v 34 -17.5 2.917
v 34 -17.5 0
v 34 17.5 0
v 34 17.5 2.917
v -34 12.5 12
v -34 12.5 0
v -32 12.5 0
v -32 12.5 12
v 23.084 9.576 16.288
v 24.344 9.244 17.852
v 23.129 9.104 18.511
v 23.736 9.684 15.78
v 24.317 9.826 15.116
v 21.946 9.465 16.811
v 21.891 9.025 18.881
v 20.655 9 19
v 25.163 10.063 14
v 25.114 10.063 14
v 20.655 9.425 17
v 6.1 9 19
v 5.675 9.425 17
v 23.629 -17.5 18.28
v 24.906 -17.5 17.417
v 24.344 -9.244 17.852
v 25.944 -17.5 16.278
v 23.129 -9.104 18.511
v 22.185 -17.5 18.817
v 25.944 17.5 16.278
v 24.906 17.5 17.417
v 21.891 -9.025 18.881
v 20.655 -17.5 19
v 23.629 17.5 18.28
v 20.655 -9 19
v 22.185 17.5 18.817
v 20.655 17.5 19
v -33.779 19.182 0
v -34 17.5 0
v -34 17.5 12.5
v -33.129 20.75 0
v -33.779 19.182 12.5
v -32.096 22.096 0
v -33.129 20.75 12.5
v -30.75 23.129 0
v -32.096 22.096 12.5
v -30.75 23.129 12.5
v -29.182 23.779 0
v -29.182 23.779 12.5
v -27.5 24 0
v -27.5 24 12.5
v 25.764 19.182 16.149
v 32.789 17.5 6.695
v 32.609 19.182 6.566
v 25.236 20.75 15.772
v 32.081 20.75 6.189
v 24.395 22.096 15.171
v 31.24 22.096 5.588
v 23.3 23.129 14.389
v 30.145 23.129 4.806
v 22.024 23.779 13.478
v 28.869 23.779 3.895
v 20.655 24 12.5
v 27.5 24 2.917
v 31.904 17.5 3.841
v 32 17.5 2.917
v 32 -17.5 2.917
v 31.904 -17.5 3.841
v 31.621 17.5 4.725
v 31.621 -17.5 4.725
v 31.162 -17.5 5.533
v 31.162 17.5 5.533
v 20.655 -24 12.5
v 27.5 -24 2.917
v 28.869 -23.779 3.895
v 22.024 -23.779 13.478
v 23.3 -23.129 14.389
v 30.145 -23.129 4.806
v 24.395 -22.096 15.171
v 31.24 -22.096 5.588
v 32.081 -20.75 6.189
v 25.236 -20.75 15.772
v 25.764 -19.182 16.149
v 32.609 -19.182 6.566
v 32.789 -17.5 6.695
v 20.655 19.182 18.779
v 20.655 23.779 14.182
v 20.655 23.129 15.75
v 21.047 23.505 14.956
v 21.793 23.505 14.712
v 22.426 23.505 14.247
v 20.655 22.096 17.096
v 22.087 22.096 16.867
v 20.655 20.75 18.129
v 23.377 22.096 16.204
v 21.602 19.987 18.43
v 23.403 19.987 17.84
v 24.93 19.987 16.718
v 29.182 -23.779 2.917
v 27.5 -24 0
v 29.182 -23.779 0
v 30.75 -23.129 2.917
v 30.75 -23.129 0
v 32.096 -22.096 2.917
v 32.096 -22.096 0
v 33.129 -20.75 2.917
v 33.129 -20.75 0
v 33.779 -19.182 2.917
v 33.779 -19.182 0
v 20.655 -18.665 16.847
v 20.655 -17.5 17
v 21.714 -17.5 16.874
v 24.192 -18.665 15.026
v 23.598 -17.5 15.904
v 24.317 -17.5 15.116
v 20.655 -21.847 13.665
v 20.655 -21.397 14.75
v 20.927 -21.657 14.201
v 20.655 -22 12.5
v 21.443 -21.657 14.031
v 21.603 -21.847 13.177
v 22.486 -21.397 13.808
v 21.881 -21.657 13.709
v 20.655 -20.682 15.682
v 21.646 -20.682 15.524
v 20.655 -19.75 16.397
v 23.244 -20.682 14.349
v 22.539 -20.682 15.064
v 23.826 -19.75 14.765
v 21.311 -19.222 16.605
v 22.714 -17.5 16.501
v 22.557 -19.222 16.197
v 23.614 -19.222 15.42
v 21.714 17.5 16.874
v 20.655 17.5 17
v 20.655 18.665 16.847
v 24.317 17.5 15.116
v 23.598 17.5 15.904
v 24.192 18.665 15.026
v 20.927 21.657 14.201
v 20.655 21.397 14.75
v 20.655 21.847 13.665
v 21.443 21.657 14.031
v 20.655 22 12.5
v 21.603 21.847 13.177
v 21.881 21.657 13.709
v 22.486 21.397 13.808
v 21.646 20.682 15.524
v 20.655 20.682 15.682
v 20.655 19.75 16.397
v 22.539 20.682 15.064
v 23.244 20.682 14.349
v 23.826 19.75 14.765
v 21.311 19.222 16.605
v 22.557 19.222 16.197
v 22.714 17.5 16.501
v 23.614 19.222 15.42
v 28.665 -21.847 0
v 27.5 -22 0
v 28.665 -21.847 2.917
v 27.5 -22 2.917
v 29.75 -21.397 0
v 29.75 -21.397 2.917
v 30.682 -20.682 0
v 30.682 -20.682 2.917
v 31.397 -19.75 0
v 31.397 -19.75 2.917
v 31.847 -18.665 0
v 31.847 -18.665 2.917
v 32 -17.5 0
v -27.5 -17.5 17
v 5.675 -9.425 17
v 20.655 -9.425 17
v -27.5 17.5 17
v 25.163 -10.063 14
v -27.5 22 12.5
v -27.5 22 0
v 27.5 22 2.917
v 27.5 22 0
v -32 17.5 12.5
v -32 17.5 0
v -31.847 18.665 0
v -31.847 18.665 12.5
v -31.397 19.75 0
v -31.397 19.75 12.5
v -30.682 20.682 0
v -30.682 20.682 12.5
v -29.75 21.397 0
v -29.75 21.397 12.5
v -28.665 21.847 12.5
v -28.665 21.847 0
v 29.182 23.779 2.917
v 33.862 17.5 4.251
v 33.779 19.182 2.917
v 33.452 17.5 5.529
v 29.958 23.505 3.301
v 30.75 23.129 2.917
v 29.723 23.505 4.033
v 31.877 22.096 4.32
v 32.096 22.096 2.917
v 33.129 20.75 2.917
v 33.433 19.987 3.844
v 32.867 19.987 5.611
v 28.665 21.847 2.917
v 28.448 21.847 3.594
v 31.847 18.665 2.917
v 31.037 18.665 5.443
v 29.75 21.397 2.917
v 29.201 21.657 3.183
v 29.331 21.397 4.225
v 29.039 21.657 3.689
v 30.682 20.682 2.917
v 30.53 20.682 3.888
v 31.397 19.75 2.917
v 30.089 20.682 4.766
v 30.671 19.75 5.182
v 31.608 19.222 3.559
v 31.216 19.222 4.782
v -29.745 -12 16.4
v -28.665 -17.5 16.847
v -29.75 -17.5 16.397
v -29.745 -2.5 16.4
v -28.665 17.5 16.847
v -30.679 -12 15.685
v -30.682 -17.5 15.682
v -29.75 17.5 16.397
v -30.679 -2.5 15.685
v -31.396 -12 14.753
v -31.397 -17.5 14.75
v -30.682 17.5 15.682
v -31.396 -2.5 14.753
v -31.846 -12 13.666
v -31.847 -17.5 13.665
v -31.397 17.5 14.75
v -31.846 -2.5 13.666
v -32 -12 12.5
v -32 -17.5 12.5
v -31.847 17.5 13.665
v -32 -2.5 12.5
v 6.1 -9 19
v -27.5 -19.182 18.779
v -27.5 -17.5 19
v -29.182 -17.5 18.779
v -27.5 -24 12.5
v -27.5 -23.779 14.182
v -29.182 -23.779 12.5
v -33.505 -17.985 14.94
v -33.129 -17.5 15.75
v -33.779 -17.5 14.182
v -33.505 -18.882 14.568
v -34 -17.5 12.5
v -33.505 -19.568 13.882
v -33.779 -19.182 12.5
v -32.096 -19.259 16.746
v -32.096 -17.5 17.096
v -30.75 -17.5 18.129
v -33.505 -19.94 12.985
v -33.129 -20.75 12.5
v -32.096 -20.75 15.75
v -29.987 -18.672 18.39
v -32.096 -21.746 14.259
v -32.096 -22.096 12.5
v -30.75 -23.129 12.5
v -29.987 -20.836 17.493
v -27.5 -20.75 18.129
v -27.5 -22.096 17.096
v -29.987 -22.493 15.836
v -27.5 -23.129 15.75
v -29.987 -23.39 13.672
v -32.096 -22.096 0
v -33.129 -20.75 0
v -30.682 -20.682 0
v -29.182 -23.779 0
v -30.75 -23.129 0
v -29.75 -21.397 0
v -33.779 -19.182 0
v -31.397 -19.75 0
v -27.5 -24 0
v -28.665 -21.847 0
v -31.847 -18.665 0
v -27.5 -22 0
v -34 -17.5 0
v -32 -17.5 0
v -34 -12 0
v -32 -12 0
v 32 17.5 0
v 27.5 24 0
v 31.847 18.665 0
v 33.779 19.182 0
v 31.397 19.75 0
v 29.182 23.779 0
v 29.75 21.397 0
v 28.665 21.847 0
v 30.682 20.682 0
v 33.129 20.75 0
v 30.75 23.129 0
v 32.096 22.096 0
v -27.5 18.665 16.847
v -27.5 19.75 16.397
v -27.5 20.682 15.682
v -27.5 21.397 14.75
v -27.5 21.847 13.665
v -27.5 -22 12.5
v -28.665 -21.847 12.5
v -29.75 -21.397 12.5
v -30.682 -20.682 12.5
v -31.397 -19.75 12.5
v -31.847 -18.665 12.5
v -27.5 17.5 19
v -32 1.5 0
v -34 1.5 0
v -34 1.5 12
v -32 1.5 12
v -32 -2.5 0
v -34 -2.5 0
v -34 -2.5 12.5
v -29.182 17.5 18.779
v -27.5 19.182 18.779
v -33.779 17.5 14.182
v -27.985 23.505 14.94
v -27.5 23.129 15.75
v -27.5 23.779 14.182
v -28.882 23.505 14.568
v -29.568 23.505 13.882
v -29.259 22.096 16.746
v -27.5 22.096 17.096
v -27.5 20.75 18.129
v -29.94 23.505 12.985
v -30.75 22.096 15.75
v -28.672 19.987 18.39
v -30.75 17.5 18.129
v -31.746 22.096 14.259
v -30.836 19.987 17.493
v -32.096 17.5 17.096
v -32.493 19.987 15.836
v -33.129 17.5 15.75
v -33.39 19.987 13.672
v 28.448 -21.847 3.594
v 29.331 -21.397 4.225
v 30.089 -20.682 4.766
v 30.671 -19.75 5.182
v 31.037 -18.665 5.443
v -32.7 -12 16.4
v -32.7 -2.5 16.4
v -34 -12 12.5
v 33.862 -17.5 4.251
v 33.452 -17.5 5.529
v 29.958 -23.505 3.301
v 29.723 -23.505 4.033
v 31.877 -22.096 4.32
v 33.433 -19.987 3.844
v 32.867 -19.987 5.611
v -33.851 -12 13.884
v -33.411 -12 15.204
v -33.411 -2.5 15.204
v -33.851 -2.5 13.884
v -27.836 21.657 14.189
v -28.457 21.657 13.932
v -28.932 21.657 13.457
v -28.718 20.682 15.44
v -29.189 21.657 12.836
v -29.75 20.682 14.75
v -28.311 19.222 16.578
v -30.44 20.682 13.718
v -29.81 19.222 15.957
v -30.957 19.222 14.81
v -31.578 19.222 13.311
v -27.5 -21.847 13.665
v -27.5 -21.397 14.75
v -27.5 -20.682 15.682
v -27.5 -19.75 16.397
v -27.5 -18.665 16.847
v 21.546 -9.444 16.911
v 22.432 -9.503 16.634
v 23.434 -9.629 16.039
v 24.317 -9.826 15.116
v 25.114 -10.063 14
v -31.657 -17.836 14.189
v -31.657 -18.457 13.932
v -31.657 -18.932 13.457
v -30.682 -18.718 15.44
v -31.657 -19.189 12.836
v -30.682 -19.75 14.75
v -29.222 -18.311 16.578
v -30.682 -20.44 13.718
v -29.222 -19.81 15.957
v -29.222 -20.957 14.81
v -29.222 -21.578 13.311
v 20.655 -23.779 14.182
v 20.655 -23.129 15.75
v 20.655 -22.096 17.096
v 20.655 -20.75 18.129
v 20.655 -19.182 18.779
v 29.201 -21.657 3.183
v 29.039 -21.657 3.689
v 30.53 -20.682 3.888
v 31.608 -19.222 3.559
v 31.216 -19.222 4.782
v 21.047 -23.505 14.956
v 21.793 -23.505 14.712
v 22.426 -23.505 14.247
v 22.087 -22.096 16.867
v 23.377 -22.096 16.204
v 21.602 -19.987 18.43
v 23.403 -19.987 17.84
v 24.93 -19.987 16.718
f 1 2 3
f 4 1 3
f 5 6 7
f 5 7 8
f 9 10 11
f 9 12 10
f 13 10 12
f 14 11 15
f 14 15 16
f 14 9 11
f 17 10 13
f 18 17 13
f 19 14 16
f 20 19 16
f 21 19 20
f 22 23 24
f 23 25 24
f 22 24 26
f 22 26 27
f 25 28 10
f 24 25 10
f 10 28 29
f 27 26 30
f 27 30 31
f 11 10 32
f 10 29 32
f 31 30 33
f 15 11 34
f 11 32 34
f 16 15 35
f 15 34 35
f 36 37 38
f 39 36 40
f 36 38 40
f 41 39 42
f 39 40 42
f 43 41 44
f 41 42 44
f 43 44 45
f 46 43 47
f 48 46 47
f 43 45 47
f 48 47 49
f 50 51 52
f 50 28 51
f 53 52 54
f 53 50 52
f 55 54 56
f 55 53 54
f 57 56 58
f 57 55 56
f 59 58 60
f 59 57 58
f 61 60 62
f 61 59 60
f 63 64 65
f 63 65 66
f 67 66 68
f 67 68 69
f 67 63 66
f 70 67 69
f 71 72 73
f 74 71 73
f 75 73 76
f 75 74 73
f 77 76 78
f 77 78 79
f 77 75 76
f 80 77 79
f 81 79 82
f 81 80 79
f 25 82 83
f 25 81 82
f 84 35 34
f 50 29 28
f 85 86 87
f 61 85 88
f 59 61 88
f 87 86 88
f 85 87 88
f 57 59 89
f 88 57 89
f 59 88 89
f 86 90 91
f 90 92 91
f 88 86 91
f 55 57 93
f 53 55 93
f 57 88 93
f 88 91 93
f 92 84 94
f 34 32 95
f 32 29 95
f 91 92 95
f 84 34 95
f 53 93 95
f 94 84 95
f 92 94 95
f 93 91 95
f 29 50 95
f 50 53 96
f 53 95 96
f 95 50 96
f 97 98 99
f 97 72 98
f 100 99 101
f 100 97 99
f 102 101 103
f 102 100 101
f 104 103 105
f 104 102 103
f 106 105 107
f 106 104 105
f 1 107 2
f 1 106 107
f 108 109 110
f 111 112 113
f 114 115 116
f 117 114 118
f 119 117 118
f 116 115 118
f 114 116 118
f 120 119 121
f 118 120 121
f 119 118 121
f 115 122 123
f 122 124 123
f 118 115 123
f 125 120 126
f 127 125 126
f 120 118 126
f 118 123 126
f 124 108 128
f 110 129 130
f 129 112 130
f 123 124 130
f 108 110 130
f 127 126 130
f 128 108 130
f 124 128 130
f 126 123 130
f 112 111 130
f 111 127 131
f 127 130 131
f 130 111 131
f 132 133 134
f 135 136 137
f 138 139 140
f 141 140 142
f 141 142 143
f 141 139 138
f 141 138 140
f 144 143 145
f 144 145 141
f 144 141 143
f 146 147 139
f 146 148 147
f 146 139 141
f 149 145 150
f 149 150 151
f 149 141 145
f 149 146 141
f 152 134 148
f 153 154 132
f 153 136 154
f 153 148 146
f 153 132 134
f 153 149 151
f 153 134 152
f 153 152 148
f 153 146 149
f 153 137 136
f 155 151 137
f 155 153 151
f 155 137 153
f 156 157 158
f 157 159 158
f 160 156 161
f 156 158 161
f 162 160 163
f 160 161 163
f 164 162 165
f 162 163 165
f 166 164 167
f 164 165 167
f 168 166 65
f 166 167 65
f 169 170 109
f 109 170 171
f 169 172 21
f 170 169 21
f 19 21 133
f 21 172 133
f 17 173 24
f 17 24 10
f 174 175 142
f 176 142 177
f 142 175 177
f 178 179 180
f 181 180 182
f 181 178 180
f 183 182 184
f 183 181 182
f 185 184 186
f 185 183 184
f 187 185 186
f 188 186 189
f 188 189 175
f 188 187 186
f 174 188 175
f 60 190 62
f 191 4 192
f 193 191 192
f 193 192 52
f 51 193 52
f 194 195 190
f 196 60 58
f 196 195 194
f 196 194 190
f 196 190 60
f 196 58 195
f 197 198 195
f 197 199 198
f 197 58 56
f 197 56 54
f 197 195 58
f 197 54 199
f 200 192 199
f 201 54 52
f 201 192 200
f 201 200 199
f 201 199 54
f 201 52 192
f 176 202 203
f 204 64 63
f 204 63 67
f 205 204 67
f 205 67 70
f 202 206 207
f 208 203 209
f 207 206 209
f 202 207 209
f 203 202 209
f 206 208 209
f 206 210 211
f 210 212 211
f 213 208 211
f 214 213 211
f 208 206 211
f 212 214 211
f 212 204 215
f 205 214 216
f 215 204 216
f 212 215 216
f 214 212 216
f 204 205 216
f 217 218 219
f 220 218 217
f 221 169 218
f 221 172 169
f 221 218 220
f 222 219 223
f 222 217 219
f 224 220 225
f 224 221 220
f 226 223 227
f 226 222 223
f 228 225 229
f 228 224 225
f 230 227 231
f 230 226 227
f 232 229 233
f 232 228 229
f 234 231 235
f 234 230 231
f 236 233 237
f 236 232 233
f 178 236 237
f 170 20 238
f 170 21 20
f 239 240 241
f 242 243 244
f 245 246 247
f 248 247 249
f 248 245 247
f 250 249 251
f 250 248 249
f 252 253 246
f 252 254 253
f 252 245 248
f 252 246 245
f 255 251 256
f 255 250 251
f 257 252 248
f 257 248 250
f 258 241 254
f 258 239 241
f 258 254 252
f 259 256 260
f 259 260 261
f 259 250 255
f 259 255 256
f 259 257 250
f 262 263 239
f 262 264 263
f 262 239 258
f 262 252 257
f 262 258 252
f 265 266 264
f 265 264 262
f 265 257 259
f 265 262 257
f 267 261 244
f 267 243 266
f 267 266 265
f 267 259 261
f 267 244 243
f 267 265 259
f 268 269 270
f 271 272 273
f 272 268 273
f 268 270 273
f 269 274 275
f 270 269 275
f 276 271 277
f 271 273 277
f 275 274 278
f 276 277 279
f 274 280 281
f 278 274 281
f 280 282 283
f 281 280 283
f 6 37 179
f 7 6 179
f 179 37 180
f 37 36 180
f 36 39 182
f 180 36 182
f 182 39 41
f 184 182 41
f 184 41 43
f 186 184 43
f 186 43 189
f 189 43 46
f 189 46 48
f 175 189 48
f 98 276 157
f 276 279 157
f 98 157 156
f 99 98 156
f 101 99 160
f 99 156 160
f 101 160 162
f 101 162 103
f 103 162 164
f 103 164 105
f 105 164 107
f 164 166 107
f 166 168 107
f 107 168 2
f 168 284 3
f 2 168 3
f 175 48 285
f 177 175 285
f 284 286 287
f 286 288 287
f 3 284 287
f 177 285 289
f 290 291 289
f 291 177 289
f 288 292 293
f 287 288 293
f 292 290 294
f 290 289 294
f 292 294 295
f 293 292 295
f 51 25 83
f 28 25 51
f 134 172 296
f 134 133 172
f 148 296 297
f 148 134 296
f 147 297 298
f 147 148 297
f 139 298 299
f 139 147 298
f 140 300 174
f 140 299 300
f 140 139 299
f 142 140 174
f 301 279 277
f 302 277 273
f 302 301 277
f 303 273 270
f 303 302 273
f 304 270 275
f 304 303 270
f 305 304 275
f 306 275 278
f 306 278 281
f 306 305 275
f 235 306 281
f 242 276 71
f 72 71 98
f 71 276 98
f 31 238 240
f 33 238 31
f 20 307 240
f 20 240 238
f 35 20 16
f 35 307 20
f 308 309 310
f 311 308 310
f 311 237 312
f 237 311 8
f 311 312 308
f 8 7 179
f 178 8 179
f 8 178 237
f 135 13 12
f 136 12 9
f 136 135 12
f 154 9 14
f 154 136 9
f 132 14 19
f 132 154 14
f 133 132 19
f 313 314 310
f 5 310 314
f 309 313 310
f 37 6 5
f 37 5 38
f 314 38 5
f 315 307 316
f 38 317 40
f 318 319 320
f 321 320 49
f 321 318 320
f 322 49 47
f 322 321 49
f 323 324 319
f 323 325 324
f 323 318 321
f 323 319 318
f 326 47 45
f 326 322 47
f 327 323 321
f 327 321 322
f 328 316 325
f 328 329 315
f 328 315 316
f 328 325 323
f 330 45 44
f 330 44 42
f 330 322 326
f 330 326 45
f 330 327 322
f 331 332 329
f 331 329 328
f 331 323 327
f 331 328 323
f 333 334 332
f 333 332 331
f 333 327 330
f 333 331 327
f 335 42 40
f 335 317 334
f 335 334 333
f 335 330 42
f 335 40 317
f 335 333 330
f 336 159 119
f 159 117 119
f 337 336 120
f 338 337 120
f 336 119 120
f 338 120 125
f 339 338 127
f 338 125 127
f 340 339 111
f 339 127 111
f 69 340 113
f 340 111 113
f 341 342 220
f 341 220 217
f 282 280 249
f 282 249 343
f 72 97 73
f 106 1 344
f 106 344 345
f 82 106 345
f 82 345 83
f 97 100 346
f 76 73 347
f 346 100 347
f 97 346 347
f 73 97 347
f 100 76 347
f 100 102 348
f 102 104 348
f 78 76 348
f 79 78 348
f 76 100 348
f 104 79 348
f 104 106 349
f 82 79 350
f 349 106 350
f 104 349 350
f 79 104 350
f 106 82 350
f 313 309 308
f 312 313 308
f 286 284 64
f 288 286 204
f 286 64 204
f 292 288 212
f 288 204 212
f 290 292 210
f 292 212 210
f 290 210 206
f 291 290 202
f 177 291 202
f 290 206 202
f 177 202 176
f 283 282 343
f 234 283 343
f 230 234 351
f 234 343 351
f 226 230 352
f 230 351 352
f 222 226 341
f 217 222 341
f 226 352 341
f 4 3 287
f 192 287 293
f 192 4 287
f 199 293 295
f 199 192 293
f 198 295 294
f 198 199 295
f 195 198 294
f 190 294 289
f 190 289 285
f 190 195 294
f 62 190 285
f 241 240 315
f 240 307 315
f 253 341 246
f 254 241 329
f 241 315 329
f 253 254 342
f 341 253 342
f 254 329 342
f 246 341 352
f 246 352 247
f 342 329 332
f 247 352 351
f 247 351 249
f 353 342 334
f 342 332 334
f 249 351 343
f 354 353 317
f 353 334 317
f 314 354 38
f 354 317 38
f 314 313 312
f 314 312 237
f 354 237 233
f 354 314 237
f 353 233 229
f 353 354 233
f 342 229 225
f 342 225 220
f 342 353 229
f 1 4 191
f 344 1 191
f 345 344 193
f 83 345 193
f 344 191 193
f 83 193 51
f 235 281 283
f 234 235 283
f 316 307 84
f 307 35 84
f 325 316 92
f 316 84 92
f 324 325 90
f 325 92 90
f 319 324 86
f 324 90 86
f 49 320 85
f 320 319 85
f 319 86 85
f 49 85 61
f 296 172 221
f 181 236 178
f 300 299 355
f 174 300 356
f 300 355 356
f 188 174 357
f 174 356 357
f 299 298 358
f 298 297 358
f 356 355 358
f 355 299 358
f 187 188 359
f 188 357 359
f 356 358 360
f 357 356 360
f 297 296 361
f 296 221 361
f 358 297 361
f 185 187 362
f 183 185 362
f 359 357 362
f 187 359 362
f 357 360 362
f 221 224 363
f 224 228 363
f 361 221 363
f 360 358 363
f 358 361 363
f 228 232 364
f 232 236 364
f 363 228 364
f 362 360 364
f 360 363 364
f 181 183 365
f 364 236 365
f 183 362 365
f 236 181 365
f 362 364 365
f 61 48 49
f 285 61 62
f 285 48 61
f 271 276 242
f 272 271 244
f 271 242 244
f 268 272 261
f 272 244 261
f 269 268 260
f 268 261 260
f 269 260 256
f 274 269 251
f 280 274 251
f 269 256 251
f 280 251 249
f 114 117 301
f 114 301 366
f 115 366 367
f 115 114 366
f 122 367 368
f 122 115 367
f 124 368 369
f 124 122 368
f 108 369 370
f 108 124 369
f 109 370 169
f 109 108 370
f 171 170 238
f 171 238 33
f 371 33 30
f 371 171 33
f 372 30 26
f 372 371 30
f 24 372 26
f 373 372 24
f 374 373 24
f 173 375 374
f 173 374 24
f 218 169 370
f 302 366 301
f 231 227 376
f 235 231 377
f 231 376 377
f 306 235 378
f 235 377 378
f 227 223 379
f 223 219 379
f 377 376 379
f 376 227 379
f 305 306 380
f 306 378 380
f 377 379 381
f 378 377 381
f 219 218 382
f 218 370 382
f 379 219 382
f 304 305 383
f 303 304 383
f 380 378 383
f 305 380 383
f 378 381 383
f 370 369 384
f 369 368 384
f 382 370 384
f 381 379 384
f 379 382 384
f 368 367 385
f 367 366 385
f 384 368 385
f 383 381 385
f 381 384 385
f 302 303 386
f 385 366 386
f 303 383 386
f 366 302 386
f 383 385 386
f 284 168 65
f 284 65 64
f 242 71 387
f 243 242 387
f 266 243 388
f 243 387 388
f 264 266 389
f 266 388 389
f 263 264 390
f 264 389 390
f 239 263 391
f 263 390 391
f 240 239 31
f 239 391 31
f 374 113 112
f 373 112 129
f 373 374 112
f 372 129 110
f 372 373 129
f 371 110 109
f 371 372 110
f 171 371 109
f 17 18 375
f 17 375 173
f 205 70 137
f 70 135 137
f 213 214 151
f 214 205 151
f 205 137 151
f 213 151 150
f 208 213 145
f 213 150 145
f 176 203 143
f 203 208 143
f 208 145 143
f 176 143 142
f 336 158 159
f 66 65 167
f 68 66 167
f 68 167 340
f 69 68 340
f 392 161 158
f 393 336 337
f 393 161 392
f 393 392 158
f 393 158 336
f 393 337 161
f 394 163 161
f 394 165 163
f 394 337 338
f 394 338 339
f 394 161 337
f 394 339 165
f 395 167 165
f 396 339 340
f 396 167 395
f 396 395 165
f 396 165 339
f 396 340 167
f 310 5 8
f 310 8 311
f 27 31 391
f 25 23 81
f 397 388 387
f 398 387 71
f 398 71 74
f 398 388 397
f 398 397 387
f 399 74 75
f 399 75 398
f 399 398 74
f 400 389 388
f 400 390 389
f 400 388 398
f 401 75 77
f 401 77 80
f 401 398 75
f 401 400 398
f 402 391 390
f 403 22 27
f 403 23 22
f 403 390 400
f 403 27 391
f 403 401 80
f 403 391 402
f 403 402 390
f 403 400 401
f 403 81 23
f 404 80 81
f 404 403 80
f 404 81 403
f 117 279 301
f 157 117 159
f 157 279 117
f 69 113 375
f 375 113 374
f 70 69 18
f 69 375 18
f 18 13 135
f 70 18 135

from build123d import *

# Parameters (mm, degrees)
SKETCH002_W     = 68
SKETCH002_H     = 48
PAD002_DEPTH    = 19
CHAMFER_SIZE2   = 10
CHAMFER_SIZE    = 14
FILLET001_R     = 6.5
THICKNESS_T     = -2
SKETCH004_W     = 18
SKETCH004_H     = 18
POCKET_DEPTH    = 5
POCKET_TAPER    = -12
SKETCH005_W     = 9.5
SKETCH005_H     = 16.4
SKETCH005_W_2   = 11
SKETCH005_H_2   = 12
POCKET001_DEPTH = 5


with BuildPart() as part:
    # Sketch002 → Pad002 (new body)
    with BuildSketch(Plane.XY):
        Rectangle(SKETCH002_W, SKETCH002_H)
    extrude(amount=PAD002_DEPTH)

    # Chamfer
    chamfer_edges = [part.edges().sort_by_distance(p)[0] for p in [
        (34, 0, 19),
    ]]
    chamfer_side = part.faces().sort_by_distance((34, 0, 9.5))[0]
    chamfer(chamfer_edges, length=CHAMFER_SIZE, length2=CHAMFER_SIZE2, reference=chamfer_side)

    # Fillet001
    fillet001_edges = [part.edges().sort_by_distance(p)[0] for p in [
        (29, -24, 12),
        (24, 0, 19),
        (-5, -24, 19),
        (-34, 0, 19),
        (-5, 24, 19),
        (29, 24, 12),
        (34, 0, 5),
        (34, 24, 2.5),
        (34, -24, 2.5),
        (-34, 24, 9.5),
        (-34, -24, 9.5),
    ]]
    fillet(fillet001_edges, radius=FILLET001_R)

    # Thickness
    thickness_openings = [part.faces().sort_by_distance(p)[0] for p in [
        (0, 0, 0),
    ]]
    offset(amount=THICKNESS_T, openings=thickness_openings)

    # Sketch004 (on Face14 of Thickness) → Pocket (cut)
    with BuildSketch(Plane.XY.offset(19)):
        with Locations((15.1, 0)):
            Rectangle(SKETCH004_W, SKETCH004_H)
    extrude(amount=-POCKET_DEPTH, taper=POCKET_TAPER, mode=Mode.SUBTRACT)

    # Sketch005 (on Face7 of Pocket) → Pocket001 (cut)
    with BuildSketch(Plane(origin=(-34, 0, 0), x_dir=(0, -1, 0), z_dir=(-1, 0, 0))):
        with Locations((7.25, 8.2)):
            Rectangle(SKETCH005_W, SKETCH005_H)
        with Locations((-7, 6)):
            Rectangle(SKETCH005_W_2, SKETCH005_H_2)
    extrude(amount=-POCKET001_DEPTH, mode=Mode.SUBTRACT)


solid = part.part
